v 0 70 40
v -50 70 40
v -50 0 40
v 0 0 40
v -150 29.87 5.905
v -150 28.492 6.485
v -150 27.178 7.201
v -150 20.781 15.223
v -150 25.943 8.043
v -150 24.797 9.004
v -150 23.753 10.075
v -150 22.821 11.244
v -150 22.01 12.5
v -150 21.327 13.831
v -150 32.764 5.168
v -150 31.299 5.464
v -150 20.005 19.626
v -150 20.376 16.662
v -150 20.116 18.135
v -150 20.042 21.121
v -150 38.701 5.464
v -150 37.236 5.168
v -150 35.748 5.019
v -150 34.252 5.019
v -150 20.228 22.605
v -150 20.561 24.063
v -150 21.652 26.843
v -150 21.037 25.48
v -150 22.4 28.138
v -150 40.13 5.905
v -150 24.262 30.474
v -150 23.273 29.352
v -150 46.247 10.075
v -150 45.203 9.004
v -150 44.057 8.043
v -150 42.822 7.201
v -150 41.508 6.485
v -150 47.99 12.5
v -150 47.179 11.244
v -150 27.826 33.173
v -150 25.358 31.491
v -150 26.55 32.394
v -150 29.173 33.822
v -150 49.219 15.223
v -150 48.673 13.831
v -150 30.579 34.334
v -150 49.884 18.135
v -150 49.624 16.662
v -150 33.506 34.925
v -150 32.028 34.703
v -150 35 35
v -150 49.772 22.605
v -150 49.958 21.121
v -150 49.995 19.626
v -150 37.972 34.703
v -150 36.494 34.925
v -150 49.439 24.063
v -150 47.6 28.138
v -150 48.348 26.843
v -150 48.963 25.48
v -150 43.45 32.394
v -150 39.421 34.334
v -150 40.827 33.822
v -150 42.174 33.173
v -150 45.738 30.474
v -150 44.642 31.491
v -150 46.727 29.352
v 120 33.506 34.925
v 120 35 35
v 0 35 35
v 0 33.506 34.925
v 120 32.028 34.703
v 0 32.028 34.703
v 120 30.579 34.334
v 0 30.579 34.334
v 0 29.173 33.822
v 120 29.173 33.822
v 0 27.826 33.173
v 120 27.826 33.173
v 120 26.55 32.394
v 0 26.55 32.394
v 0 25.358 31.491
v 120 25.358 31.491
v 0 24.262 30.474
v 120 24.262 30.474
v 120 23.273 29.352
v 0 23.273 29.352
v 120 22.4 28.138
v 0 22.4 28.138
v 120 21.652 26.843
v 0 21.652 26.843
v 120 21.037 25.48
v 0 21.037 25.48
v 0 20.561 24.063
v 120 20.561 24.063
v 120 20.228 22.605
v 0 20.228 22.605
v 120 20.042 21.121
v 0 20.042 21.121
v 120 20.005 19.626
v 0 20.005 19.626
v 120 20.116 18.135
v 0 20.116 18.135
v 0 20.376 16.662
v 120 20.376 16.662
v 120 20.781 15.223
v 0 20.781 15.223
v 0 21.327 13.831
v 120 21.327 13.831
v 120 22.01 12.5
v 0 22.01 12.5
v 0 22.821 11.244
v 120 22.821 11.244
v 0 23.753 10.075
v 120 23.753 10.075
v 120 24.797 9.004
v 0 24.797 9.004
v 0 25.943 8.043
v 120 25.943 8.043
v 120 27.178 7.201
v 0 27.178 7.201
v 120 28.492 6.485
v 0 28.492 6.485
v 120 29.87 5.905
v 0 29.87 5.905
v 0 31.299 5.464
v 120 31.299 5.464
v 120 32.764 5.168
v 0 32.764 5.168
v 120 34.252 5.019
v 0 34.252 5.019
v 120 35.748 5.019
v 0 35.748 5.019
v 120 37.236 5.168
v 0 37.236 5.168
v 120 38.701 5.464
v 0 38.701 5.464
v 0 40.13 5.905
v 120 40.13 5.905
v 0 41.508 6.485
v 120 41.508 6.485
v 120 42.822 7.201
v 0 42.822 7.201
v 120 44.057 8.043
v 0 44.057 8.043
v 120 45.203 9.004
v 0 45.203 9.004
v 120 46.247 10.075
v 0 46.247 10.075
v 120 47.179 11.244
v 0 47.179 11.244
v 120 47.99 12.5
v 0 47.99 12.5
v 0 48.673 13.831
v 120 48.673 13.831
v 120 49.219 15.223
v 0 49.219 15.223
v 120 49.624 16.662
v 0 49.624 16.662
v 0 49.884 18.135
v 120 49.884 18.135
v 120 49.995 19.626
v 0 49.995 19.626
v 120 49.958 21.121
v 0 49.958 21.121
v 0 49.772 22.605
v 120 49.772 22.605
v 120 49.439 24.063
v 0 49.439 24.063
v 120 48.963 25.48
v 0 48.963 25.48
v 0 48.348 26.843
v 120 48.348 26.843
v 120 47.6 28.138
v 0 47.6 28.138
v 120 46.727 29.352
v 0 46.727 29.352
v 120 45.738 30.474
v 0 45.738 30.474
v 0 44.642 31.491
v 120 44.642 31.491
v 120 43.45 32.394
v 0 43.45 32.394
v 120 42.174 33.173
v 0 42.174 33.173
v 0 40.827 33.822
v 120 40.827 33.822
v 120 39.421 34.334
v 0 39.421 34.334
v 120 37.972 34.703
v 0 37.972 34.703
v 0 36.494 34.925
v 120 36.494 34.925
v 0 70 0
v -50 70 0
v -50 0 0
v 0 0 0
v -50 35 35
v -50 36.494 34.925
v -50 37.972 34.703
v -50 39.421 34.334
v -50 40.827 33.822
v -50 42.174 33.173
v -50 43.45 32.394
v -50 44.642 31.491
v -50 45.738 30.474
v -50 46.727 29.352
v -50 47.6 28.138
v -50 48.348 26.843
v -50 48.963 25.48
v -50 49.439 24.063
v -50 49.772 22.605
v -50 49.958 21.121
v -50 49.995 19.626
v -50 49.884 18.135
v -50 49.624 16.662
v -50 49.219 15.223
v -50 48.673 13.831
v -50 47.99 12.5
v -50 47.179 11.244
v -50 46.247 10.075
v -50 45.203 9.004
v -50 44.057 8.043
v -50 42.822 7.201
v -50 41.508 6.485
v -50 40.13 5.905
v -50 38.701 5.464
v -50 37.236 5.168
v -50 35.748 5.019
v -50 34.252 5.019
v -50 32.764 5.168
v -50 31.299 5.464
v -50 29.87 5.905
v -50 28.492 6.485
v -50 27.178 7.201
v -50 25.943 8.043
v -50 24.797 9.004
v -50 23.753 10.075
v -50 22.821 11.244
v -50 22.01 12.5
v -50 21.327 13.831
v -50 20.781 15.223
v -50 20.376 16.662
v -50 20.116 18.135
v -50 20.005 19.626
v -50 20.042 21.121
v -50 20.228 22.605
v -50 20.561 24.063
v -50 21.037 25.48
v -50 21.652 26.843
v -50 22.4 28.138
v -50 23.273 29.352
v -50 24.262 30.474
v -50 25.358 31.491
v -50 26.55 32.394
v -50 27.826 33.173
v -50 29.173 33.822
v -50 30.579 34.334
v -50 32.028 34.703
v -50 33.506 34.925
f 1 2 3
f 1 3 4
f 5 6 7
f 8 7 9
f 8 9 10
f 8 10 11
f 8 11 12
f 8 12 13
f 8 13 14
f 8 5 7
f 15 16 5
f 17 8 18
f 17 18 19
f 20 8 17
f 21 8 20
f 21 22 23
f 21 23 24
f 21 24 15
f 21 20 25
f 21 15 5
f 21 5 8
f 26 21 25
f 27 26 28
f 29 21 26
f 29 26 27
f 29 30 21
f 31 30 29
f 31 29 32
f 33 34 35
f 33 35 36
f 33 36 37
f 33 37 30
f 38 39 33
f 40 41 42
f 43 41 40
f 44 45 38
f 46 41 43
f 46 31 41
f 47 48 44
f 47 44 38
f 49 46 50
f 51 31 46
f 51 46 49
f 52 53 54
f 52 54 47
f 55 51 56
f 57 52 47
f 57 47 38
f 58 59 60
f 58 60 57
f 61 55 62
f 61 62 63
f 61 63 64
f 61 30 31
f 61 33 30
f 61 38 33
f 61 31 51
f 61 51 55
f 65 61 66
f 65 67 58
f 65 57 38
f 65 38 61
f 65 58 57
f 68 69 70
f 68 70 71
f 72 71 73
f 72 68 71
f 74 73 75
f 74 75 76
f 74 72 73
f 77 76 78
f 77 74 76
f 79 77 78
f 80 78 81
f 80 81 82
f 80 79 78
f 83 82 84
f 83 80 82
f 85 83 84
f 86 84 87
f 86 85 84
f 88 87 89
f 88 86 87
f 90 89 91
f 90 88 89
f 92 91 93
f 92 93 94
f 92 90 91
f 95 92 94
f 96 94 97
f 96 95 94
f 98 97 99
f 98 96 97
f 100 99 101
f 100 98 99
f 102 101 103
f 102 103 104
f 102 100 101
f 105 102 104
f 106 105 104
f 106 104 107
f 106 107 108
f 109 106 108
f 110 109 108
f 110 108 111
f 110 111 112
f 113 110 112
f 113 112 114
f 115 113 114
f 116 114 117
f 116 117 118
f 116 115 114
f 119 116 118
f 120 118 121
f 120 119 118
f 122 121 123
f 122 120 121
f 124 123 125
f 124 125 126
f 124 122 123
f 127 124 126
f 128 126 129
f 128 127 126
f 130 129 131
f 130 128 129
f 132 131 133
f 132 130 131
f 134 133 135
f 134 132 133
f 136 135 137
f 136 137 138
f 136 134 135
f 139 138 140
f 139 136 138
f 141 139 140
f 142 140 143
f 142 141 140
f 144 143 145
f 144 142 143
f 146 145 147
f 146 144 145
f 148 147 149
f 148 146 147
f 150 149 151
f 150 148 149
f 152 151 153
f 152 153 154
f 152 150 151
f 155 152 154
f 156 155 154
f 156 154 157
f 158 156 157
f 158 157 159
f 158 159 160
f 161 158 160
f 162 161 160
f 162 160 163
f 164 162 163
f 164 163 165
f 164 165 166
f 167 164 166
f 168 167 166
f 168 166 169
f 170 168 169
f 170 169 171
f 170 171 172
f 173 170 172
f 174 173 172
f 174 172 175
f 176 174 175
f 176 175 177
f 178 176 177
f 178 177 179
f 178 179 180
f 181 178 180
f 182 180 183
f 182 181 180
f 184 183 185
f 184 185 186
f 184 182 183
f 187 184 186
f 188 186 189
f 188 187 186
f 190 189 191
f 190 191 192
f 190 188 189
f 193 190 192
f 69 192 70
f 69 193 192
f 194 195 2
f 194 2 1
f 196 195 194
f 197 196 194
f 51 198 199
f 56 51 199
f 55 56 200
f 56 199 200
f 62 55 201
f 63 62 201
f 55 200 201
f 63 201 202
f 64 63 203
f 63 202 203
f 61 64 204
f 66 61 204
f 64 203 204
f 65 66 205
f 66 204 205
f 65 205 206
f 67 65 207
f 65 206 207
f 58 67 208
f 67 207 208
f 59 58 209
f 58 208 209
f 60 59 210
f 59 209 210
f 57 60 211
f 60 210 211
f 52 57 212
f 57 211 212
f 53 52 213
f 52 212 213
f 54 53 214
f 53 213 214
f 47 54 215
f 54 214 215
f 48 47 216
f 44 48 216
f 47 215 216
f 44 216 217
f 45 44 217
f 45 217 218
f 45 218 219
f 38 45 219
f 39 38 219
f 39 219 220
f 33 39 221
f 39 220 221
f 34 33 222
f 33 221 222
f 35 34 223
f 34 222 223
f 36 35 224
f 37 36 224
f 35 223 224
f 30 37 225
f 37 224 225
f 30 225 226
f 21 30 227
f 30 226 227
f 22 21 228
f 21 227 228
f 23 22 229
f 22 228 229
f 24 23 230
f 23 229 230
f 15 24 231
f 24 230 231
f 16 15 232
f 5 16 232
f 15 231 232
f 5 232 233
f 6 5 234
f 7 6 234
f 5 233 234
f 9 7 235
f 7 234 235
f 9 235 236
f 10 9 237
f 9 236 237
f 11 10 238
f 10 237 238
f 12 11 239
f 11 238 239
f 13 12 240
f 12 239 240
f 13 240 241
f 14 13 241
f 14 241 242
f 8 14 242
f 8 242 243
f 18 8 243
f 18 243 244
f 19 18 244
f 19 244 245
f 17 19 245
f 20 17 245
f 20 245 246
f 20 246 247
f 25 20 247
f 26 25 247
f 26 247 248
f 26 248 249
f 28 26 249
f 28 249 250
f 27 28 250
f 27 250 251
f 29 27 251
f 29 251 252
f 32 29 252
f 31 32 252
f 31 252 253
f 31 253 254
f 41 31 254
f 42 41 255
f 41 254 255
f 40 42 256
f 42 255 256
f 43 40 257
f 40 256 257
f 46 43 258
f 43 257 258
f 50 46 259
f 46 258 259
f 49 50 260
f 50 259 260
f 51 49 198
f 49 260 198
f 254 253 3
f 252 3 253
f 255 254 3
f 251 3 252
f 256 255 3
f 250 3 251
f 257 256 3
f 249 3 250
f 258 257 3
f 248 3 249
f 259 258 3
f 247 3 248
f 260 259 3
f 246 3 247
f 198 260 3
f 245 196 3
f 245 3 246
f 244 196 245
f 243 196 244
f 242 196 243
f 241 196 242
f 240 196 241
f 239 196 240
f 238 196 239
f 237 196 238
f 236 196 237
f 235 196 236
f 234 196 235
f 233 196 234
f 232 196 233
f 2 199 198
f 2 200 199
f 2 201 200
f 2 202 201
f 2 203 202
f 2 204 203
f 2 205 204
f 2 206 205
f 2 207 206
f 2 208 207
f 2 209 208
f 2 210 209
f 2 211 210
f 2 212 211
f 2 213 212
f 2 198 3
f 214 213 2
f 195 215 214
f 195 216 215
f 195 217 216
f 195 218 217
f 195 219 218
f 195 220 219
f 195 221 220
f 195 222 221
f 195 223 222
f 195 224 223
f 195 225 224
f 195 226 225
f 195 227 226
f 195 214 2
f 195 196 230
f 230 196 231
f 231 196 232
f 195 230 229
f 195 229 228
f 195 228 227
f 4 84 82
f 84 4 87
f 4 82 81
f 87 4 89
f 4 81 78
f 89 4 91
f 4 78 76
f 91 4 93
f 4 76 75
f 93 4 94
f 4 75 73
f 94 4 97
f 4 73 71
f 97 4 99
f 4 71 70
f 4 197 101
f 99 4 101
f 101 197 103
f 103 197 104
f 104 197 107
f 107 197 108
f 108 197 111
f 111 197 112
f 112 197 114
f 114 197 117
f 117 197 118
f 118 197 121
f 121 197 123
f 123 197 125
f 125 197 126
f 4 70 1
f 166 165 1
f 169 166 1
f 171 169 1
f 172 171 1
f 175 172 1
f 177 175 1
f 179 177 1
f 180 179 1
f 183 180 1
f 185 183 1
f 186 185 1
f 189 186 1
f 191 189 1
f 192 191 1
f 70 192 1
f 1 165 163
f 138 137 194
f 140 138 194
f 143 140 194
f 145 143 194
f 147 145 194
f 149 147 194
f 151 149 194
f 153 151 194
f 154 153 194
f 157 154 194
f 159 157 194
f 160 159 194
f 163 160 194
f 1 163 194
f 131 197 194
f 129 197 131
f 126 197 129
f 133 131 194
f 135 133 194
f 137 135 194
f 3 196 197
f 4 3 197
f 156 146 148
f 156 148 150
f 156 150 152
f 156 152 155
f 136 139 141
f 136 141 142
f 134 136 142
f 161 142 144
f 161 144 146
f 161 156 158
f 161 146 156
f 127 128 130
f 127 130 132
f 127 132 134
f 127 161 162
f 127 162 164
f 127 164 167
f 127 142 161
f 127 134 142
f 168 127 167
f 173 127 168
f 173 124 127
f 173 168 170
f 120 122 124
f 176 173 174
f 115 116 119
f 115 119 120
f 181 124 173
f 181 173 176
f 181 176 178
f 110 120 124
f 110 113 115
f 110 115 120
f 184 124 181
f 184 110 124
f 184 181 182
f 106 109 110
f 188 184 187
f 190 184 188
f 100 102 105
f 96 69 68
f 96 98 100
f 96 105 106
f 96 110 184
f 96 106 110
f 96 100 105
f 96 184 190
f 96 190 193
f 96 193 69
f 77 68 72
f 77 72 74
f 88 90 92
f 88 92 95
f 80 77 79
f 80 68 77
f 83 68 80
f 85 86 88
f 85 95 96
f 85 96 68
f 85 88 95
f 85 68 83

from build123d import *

# Parameters (mm, degrees)
SKETCH1_W           = 50
SKETCH1_H           = 70
BOSS_EXTRUDE1_DEPTH = 40
SKETCH3_R           = 15
BOSS_EXTRUDE3_DEPTH = 100
BOSS_EXTRUDE4_START = 120
SKETCH4_R           = 15
BOSS_EXTRUDE4_DEPTH = 120


with BuildPart() as part:
    # Sketch1 → Boss-Extrude1 (new body)
    with BuildSketch(Plane.XY):
        with Locations((-25, 35)):
            Rectangle(SKETCH1_W, SKETCH1_H)
    extrude(amount=BOSS_EXTRUDE1_DEPTH)

    # Sketch3 → Boss-Extrude3 (add)
    with BuildSketch(Plane.ZY.offset(50)):
        with Locations((20, 35)):
            Circle(SKETCH3_R)
    extrude(amount=BOSS_EXTRUDE3_DEPTH)

    # Sketch4 → Boss-Extrude4 (add)
    with BuildSketch(Plane(origin=(0, 0, 0), x_dir=(0, 0, -1), z_dir=(1, 0, 0)).offset(BOSS_EXTRUDE4_START)):
        with Locations(Location((-20, 35, 0), (0, 0, 180))):
            Circle(SKETCH4_R)
    extrude(amount=-BOSS_EXTRUDE4_DEPTH)


solid = part.part
